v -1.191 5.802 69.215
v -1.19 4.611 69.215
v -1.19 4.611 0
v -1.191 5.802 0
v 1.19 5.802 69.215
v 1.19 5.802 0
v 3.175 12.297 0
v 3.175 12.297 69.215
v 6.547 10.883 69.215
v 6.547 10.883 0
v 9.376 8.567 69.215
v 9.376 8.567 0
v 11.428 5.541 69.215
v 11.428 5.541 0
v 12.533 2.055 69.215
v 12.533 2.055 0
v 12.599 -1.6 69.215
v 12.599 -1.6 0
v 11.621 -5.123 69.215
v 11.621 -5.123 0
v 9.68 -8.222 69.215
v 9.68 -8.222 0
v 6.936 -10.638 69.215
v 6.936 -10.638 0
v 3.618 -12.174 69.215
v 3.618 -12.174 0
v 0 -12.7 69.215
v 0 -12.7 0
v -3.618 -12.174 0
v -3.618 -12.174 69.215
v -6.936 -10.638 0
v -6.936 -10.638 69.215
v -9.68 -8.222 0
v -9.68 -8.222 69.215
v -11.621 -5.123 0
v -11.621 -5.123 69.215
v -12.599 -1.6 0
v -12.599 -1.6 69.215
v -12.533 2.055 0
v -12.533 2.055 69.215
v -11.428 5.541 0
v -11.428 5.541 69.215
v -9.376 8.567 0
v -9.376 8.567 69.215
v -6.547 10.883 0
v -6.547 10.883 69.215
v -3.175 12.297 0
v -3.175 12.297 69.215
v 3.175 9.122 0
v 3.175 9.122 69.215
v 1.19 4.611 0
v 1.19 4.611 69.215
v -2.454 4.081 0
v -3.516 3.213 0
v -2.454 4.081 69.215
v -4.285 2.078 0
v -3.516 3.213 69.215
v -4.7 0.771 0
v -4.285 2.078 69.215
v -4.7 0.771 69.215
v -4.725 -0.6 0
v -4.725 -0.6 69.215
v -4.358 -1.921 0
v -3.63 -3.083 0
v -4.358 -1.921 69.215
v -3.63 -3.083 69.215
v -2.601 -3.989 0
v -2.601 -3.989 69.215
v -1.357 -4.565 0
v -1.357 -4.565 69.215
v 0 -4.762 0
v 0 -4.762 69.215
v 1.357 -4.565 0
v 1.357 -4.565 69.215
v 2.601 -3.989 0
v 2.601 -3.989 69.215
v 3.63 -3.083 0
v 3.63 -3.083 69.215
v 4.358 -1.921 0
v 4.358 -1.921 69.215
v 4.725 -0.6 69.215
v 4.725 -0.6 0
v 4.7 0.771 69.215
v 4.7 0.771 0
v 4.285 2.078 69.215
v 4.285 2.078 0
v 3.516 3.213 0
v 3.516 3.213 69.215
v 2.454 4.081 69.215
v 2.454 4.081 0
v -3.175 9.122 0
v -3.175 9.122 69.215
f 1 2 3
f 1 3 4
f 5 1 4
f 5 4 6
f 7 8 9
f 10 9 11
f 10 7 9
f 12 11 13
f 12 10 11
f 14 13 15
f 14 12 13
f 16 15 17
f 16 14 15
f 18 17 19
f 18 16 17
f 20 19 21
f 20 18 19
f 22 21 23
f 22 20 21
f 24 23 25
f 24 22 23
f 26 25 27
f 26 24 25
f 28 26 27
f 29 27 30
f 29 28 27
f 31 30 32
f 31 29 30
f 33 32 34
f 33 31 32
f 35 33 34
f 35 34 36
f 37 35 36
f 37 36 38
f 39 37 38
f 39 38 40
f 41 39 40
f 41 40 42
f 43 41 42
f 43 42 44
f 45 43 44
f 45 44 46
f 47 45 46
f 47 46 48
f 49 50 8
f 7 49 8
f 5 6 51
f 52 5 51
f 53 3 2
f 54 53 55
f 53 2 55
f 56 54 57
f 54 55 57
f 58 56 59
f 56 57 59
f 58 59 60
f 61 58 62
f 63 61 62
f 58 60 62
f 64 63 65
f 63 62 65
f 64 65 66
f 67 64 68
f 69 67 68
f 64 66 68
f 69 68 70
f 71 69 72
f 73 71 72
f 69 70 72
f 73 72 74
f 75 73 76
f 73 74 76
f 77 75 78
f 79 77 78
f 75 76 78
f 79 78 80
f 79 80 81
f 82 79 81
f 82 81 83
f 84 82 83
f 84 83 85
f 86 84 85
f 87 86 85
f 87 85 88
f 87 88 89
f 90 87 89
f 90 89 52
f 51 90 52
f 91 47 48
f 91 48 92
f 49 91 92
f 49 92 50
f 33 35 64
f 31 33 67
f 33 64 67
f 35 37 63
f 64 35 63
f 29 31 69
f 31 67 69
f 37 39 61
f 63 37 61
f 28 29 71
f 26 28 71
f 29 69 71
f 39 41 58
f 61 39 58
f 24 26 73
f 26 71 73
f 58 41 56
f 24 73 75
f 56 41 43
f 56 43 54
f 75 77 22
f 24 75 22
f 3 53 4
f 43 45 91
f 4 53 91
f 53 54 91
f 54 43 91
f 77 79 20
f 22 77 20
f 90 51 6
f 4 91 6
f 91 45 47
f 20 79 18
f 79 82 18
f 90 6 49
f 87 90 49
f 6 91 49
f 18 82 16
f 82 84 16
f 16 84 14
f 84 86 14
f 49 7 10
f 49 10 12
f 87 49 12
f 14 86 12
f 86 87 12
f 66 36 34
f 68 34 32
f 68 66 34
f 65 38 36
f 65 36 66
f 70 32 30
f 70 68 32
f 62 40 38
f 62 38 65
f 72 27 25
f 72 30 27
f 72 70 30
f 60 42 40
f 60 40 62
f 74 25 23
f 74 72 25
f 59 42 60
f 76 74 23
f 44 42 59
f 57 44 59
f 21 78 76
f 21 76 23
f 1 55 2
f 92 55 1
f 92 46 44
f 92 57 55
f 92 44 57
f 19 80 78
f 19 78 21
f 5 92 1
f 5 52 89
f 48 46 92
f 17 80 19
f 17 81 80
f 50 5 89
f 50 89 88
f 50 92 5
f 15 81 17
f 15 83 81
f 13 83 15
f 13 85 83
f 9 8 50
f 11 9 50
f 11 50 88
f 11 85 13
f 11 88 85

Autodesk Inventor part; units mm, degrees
ref_plane "YZ Plane" through (0, 0, 0) normal (1, 0, 0) x (0, 1, 0)
ref_plane "XZ Plane" through (0, 0, 0) normal (0, 1, 0) x (-1, 0, 0)
ref_plane "XY Plane" through (0, 0, 0) normal (0, 0, 1) x (1, 0, 0)
sketch "Sketch1" plane through (0, 0, 0) normal (0, 0, 1) x (1, 0, 0)
  circle A0 centre (0, 0) radius 12.7
  dimension "d0" = 25.4
extrude "Extrusion1" add sketch "Sketch1" along normal blind 69.215
sketch "Sketch2" plane through (0, 0, 69.215) normal (0, 0, 1) x (1, 0, 0)
  circle A0 centre (0, 0) radius 12.7 projected
  line L0 (0, 0) -> (-3.6945, 0)
  line L1 (1.19, 5.802) -> (1.19, 4.6114)
  arc A1 (-1.19, 4.6114) -> (1.19, 4.6114) centre (0, 0) ccw
  line L2 (-1.19, 4.6114) -> (-1.1912, 4.6114)
  line L3 (-1.1912, 4.6114) -> (-1.1912, 5.802)
  line L4 (-1.1912, 5.802) -> (1.19, 5.802)
extrude "Extrusion2" cut sketch "Sketch2" against normal blind 69.469 contours L1 A1 L3 L4
sketch "Sketch3" plane through (0, 0, 69.215) normal (0, 0, 1) x (1, 0, 0)
  line L0 (-1.1912, 4.6114) -> (-1.1912, 5.802) projected
  circle A0 centre (0, 0) radius 12.7 projected
  line L1 (0, 0) -> (-3.175, 0)
  line L2 (-3.175, 12.2967) -> (-3.175, 9.1217)
  line L3 (-3.175, 9.1217) -> (3.175, 9.1217)
  line L4 (3.175, 9.1217) -> (3.175, 12.2967)
  dimension "d5" = 3.175
  dimension "d6" = 3.175
  dimension "d7" = 6.35
extrude "Extrusion3" cut sketch "Sketch3" against normal blind 69.469 contours L4 L3 L2 A0 picked at (-0.3561, 10.2995)
properties part number "winch insert" material "Aluminum 6061"
